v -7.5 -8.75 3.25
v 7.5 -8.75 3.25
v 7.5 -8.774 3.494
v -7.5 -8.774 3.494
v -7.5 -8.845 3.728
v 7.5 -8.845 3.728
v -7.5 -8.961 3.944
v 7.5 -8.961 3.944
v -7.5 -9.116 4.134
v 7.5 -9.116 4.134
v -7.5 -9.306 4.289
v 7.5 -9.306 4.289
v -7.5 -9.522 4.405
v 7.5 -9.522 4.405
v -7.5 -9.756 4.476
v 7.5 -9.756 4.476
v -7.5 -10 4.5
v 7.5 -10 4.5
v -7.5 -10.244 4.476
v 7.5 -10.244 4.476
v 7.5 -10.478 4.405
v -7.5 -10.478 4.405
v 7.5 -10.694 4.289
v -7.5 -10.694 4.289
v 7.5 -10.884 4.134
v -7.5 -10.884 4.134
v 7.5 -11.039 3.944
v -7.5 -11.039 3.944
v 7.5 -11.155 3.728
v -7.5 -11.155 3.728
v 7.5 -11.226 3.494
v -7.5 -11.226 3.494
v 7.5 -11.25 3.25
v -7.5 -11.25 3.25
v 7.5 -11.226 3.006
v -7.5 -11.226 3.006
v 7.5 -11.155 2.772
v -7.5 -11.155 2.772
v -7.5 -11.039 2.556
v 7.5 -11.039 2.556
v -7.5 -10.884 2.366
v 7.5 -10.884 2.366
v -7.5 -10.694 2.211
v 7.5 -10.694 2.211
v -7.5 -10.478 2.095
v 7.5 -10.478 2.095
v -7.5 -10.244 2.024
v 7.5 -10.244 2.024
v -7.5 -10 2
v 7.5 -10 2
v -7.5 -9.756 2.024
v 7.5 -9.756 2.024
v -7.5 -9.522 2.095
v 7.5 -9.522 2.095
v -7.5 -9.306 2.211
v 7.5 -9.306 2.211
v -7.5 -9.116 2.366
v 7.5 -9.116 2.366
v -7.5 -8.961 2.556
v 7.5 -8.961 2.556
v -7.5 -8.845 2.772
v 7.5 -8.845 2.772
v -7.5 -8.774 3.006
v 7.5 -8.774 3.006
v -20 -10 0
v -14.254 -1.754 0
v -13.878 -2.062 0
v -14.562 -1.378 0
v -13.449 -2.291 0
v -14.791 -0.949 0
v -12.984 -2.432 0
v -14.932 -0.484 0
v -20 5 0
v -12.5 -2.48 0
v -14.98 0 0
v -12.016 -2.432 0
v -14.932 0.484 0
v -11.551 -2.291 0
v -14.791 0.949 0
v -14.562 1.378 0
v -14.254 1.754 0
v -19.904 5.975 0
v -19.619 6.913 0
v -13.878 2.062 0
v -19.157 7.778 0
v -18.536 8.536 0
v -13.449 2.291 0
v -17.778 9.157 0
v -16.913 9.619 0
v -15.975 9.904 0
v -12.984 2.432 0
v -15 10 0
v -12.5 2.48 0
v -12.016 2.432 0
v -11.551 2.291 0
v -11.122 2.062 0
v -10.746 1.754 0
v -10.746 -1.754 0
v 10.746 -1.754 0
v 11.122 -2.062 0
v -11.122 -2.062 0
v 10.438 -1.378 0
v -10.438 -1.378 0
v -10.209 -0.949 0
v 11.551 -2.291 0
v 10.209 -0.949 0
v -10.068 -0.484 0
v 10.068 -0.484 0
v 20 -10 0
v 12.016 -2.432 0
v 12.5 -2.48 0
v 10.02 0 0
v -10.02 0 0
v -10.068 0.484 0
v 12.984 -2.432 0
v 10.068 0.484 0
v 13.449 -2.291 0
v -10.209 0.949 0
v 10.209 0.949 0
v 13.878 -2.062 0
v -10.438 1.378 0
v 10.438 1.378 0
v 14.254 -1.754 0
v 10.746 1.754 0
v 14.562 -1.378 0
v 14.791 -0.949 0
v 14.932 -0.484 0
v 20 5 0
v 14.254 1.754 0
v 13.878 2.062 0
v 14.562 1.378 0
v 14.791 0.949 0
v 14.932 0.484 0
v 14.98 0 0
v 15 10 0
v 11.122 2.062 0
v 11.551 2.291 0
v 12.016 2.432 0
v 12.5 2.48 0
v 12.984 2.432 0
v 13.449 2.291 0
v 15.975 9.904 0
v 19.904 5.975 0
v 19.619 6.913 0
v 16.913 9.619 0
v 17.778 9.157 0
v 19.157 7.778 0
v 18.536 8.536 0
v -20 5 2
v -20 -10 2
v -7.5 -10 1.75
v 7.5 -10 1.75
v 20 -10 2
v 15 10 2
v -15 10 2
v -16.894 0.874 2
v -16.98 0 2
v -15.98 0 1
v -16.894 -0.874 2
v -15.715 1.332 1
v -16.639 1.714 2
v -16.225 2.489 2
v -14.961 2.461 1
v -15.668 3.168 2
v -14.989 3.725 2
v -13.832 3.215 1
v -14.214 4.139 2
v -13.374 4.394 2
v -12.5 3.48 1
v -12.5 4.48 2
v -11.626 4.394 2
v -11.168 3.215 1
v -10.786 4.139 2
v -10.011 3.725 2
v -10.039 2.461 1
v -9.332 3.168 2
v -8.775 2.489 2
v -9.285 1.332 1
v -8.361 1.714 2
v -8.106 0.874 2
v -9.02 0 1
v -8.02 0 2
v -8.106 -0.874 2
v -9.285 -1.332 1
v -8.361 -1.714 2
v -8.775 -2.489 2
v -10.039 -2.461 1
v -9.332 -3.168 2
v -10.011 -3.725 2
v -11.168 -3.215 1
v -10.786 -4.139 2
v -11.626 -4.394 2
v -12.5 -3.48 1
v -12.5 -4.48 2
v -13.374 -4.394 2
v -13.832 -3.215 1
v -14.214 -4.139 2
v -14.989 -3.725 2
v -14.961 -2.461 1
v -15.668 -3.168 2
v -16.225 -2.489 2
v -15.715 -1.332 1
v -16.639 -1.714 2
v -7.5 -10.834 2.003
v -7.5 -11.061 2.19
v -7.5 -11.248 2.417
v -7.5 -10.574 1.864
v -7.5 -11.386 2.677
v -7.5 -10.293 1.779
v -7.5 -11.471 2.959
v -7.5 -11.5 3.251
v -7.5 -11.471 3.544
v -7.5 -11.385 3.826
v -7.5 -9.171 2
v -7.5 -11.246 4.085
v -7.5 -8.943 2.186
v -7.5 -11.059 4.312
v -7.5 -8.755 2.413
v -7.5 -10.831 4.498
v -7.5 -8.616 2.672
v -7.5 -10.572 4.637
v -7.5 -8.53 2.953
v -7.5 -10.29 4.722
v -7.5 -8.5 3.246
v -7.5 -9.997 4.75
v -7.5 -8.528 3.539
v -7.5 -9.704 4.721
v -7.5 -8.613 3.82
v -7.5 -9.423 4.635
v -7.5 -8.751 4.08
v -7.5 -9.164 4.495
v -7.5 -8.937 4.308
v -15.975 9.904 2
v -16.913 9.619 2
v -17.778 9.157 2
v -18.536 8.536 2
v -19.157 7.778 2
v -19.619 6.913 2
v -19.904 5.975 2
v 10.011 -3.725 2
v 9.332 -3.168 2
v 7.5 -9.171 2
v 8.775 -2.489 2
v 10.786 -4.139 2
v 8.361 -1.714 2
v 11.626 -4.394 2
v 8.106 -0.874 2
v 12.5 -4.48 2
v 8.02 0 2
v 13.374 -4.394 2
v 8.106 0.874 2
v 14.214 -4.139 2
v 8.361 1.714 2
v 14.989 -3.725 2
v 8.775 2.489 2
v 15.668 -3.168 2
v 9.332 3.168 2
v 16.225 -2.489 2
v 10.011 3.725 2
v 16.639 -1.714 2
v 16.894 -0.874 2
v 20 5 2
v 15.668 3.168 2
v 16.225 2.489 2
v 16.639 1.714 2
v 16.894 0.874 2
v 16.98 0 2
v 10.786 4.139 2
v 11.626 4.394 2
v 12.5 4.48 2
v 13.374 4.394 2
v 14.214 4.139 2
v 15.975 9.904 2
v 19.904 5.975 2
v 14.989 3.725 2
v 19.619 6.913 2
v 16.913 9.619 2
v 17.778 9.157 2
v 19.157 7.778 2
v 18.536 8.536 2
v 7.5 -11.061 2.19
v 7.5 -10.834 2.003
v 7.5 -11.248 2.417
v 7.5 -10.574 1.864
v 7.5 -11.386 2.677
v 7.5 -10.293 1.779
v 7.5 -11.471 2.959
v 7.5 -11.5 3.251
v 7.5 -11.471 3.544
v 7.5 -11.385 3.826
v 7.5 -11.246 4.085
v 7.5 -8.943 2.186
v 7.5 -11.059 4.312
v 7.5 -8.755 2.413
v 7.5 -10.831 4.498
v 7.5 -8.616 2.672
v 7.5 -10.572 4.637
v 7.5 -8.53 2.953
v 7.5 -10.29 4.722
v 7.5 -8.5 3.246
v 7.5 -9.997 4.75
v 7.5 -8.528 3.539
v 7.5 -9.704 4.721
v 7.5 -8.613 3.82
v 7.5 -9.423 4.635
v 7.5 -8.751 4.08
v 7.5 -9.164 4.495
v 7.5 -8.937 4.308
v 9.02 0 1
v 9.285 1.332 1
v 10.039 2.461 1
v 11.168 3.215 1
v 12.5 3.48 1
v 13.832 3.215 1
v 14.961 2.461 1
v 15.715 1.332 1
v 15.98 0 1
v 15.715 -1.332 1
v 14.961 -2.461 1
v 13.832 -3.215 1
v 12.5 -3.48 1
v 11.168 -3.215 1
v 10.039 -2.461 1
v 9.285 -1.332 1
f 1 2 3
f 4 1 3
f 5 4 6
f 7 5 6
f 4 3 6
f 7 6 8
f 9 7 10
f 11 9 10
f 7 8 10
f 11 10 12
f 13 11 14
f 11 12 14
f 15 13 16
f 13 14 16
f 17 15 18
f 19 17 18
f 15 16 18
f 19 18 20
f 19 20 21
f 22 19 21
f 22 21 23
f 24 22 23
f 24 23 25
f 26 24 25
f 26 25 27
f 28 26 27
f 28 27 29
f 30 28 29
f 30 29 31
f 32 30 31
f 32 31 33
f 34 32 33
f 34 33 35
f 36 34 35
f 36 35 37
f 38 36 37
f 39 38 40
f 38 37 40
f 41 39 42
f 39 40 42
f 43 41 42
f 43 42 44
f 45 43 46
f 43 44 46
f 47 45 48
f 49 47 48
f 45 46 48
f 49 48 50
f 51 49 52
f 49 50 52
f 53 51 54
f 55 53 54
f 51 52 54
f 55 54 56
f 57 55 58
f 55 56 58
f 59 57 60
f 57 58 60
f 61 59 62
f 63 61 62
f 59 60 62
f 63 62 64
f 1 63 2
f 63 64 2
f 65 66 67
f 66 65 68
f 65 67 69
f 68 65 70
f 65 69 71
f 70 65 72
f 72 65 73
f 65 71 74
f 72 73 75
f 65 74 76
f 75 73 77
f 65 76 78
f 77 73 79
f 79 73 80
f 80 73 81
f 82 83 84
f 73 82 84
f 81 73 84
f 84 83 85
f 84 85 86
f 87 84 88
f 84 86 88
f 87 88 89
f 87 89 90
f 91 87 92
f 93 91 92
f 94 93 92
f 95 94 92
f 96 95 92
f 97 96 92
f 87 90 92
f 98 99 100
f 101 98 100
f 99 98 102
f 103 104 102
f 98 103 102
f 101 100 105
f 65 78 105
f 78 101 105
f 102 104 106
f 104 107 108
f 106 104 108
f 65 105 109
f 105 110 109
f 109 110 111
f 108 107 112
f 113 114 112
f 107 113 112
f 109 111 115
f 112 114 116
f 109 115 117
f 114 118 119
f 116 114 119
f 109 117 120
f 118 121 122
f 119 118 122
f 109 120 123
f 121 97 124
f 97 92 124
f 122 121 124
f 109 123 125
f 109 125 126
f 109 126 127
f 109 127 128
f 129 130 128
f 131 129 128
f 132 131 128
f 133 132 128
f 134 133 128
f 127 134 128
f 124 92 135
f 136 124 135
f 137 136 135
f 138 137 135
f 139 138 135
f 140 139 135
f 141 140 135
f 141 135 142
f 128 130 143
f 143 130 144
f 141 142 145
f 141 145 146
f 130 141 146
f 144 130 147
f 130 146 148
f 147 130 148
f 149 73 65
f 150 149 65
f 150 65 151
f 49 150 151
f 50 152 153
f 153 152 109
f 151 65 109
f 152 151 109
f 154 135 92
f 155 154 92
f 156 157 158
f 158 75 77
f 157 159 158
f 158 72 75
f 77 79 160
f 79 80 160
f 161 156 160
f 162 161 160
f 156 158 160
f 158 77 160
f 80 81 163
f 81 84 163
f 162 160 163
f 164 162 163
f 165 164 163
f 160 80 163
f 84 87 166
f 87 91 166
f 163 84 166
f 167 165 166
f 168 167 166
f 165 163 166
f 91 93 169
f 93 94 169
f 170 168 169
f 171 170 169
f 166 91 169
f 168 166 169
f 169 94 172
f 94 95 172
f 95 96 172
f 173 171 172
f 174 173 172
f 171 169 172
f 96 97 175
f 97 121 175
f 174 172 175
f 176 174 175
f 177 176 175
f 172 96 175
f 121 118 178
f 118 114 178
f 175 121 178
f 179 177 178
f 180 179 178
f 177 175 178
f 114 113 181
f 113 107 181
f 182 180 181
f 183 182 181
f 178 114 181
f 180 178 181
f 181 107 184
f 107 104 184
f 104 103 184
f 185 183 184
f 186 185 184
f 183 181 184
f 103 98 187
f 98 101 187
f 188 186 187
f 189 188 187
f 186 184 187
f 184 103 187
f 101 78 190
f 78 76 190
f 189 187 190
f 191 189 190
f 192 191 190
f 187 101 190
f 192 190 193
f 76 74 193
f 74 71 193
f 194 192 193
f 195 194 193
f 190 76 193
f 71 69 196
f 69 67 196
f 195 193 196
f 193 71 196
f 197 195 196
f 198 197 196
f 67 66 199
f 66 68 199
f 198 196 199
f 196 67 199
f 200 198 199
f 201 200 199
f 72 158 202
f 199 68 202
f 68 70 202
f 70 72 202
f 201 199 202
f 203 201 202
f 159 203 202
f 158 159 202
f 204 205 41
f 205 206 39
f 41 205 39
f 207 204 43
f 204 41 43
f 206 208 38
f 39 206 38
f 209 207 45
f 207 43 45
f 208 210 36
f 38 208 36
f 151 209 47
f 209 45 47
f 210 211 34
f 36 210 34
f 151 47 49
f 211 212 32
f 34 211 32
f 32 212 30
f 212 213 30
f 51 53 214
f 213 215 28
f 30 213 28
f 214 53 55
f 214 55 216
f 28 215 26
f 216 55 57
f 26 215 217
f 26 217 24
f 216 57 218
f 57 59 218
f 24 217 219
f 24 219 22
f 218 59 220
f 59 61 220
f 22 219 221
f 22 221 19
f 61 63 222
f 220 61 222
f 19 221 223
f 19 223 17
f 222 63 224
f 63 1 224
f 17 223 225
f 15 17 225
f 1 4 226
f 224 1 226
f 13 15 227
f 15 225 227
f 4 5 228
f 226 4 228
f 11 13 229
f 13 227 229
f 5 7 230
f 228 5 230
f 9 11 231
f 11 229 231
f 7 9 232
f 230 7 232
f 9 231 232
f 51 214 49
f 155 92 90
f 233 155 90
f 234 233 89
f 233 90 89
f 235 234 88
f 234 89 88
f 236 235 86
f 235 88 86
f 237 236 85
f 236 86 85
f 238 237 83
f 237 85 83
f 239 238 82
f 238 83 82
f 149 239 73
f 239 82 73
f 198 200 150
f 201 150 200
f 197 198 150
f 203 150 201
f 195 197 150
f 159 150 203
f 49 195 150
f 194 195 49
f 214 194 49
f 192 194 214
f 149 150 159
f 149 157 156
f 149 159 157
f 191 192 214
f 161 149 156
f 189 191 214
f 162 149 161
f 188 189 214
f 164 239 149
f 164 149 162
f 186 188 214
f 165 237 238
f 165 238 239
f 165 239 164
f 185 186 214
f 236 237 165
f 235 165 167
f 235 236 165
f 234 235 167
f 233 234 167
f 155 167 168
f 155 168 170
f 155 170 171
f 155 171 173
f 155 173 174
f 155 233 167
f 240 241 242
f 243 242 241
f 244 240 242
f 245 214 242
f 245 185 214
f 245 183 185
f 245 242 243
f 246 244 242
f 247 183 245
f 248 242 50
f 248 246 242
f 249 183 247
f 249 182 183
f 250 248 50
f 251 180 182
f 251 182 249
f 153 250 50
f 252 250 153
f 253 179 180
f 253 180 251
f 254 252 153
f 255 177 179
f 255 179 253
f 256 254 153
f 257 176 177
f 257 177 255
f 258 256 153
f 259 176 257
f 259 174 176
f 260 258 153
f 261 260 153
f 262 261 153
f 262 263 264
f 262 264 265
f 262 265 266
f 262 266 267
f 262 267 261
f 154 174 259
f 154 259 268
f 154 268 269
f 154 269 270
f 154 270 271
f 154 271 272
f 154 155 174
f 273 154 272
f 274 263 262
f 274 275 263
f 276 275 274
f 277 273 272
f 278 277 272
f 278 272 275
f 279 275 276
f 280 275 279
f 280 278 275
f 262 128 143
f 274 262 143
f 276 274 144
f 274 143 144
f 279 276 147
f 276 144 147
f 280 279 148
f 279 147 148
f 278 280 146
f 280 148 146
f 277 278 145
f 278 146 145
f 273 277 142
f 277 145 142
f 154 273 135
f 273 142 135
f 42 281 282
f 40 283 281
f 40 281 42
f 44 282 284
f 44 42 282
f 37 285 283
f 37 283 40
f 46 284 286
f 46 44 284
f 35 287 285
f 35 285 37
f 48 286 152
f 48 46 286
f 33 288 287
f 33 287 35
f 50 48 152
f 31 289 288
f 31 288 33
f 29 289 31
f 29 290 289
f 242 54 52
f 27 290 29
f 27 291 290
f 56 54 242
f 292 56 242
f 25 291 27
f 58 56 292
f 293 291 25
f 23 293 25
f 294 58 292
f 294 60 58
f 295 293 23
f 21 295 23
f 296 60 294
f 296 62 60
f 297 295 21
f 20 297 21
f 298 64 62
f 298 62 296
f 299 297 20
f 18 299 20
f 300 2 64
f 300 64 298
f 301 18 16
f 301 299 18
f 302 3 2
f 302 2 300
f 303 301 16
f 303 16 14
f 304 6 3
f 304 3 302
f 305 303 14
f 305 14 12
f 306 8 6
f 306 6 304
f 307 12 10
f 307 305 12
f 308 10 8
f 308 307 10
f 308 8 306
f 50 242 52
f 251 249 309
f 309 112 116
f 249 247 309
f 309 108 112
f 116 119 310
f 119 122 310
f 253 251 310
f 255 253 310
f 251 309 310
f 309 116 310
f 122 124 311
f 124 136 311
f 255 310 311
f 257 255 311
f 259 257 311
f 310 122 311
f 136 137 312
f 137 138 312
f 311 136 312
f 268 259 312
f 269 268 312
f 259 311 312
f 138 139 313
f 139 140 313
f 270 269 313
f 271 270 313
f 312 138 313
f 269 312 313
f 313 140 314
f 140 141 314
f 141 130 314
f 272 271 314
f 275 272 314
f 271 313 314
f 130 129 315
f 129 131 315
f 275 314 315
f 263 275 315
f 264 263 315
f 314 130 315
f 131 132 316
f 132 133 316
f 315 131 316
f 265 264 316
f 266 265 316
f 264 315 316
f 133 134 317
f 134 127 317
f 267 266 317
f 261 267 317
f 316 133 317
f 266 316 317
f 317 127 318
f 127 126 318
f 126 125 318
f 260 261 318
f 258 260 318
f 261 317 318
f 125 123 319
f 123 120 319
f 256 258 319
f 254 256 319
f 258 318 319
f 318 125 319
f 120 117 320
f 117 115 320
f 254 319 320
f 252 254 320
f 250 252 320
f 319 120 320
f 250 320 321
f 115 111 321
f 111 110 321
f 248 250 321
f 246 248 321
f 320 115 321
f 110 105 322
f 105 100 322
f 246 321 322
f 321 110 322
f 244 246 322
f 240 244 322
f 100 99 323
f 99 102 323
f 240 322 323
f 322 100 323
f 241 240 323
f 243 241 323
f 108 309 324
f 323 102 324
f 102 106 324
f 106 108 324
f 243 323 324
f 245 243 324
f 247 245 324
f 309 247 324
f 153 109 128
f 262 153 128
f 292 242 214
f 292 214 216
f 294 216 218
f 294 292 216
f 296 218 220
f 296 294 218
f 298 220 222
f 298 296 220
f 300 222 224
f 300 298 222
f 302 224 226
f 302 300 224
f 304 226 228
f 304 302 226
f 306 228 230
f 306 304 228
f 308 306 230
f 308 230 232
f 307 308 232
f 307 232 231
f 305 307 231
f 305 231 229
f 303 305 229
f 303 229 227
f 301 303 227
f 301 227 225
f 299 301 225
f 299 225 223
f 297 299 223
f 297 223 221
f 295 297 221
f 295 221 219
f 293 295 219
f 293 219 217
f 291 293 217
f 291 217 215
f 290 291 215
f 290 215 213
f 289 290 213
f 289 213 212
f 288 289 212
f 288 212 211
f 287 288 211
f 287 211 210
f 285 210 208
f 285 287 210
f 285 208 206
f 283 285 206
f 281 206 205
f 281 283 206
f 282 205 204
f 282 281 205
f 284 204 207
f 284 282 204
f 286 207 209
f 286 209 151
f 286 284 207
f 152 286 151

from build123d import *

# Parameters (mm, degrees)
F1_DEPTH       = 2
F3_R           = 1.5
F5_DEPTH       = 15
F6_R           = 1.25
F7_DEPTH       = 66
F9_D           = 4.4
F9_DEPTH       = 14.1
F9_CSINK_D     = 8.96
F9_CSINK_ANGLE = 90
F9_TIP         = 1.3218933619


# Not quite as in the source:
# - an extrude ends at something that could not be found from the text; its depth is read off the source's solid


with BuildPart() as f1:
    # F0 (on Top) → F1 (new body)
    with BuildSketch(Plane.XY):
        with BuildLine():
            ThreePointArc((20, 5), (18.5355339059, 8.5355339059), (15, 10))
            Line((15, 10), (-15, 10))
            ThreePointArc((-15, 10), (-18.5355339059, 8.5355339059), (-20, 5))
            Line((-20, 5), (-20, -10))
            Line((-20, -10), (20, -10))
            Line((20, -10), (20, 5))
        make_face()
    extrude(amount=F1_DEPTH)

    # F3 (on offset) → F5 (join, through all)
    with BuildSketch(Plane.YZ.offset(7.5)):
        with Locations((-10, 3.25)):
            Circle(F3_R)
    extrude(amount=-F5_DEPTH)

    # F6 (on face) → F7 (cut, through all)
    with BuildSketch(Plane.YZ.offset(20)):
        with Locations((-10, 3.25)):
            Circle(F6_R)
    extrude(amount=-F7_DEPTH, mode=Mode.SUBTRACT)

    # F9
    with Locations(Plane.XY.offset(2)):
        with Locations((-12.5, 0), (12.5, 0)):
            CounterSinkHole(F9_D / 2, F9_CSINK_D / 2, depth=F9_DEPTH, counter_sink_angle=F9_CSINK_ANGLE)
            with Locations((0, 0, -(F9_DEPTH + F9_TIP / 2))):  # 118° drill point
                Cone(0, F9_D / 2, F9_TIP, mode=Mode.SUBTRACT)


solid = f1.part
